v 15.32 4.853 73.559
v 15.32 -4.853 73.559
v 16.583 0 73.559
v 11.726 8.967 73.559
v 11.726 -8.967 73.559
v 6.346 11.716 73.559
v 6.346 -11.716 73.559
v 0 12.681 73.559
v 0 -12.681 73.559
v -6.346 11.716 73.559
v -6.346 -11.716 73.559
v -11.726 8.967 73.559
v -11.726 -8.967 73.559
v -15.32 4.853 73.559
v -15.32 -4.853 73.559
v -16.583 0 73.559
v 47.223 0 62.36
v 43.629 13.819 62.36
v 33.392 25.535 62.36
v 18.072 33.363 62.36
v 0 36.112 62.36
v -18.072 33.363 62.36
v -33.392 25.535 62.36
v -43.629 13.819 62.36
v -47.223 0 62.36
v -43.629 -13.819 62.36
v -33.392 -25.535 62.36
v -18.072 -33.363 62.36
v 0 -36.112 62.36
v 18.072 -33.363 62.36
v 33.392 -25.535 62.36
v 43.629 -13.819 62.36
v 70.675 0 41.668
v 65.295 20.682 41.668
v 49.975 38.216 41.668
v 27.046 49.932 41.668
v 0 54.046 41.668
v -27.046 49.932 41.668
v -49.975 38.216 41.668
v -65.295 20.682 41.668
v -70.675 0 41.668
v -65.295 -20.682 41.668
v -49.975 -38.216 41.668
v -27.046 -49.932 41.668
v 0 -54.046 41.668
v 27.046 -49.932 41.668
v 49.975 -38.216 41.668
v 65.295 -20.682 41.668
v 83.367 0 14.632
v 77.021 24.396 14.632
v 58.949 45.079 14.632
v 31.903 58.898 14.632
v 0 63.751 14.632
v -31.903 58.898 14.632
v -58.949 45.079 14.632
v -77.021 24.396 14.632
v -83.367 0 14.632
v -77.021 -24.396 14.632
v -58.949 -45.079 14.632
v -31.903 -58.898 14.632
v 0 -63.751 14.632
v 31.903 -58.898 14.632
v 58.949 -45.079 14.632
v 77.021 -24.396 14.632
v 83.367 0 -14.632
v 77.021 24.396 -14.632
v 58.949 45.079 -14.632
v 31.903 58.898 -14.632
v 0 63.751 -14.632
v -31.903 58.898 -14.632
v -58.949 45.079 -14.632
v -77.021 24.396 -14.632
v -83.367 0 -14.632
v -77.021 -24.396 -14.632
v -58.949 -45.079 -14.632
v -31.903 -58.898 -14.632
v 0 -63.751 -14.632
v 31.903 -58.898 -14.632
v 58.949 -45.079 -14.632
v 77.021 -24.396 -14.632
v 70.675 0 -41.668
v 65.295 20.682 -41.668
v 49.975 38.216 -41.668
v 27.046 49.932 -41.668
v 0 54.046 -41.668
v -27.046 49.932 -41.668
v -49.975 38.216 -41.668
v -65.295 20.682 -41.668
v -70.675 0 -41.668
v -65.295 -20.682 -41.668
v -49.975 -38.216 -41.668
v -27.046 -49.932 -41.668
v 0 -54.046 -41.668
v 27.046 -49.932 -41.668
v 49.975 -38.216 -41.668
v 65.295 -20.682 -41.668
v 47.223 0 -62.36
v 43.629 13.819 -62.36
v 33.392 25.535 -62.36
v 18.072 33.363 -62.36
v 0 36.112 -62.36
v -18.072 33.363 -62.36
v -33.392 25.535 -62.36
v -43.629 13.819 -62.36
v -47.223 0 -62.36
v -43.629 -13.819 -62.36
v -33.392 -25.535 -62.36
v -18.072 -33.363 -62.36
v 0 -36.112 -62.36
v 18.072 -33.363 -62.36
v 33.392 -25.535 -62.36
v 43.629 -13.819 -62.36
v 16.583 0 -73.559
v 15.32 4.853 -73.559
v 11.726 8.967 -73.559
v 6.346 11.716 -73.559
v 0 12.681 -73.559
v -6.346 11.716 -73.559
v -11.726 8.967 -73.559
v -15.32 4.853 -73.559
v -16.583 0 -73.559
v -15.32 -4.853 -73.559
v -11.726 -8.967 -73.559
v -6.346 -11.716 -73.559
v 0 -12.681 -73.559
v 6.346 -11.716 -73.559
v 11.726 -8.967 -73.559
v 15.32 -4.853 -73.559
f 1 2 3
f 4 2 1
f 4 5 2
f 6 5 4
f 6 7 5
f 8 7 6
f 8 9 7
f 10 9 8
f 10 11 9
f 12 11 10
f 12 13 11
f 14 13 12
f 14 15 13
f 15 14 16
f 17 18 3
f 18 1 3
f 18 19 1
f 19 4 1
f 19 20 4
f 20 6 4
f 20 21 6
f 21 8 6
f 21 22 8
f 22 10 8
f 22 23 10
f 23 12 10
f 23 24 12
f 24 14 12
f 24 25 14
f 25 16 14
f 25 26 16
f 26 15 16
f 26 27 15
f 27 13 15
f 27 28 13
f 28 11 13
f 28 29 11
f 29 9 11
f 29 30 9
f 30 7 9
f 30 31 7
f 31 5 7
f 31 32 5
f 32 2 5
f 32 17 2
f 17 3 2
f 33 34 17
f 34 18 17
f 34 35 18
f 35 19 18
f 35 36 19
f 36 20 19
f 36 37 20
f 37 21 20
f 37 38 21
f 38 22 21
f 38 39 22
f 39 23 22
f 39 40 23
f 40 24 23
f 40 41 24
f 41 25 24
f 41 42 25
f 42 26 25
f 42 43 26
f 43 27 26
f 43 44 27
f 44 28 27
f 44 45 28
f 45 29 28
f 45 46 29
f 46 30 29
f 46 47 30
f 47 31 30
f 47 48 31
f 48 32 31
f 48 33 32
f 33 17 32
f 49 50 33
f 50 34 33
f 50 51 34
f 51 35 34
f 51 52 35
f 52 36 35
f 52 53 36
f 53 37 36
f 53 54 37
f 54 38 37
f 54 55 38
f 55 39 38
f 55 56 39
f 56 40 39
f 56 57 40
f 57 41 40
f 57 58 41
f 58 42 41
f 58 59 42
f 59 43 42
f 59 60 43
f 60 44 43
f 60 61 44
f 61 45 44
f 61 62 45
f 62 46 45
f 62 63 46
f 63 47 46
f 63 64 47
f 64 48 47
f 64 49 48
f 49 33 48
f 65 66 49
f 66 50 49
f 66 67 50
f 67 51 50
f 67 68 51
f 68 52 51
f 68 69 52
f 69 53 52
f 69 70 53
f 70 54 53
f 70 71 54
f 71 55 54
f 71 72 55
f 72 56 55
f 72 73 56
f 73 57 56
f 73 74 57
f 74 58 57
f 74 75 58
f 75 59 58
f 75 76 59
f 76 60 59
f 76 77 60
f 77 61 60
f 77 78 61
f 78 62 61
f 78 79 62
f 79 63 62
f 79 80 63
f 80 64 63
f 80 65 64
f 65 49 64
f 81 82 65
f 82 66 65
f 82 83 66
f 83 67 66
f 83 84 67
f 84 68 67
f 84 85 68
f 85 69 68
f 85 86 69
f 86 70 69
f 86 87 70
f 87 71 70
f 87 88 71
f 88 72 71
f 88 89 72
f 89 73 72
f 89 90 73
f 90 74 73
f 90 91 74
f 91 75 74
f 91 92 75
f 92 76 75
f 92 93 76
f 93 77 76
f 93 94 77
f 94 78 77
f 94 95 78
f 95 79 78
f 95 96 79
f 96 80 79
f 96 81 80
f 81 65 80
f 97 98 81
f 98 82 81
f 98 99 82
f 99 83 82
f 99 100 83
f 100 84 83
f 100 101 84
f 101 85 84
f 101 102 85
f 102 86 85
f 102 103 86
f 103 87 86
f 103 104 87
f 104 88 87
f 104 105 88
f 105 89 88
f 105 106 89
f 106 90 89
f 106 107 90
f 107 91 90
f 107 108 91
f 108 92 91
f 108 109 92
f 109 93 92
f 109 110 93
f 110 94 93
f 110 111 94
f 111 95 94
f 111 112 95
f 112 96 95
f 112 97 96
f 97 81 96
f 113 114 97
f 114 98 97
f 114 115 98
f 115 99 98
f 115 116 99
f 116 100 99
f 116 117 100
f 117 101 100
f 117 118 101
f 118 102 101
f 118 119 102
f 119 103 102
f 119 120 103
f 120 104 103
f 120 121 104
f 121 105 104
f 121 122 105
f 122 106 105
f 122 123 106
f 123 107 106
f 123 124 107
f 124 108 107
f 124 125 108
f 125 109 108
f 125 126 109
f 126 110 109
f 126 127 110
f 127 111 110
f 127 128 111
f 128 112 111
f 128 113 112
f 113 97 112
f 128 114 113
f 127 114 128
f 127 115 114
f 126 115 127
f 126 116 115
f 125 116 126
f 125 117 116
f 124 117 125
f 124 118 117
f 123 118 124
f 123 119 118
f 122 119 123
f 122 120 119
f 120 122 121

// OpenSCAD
// Generated by SolidPython 1.0.1 on 2020-07-29 00:46:53


scale(v = [17, 13, 15]) {
	sphere(r = 5);
}
/***********************************************
*********      SolidPython code:      **********
************************************************
 
# import packages: SolidPython
from solid import *
from solid.utils import *
from itertools import chain, combinations, permutations


class Resize:

    def __init__(self, scad_file):
        self.scad_file = scad_file
        #self.scad_file = import_scad(scad_file)
        # cone/cylinder param:
        self.r1 = 0
        self.r2 = 0
        self.h = 0
        # rectangular prism param:
        self.w = 0
        self.l = 0
        # ellipse param:
        self.r = 0

    # import OpenScad code (file name corresponds to shape)


    # classify shape + parameters
    def assign(self, param1, param2, param3):
        if self.scad_file == 'cone.scad':
            self.r1 = param1
            self.r2 = param2
            self.h = param3
        elif self.scad_file == 'cylinder.scad':
            self.r1 = param1
            self.r2 = param2
            self.h = param3
        elif self.scad_file == 'rectangularPrism.scad':
            self.h = param1
            self.l = param2
            self.w = param3
        else:
            self.r = param1
            self.h = param2

    # resize parameters
    def iterate(self):
        x = range(3, 20, 2)
        i = 1
        if self.scad_file == 'cone.scad':
            tempList = list(permutations(x, 2))
            for temp in tempList:
                param1 = temp[0]
                param2 = temp[1]
                filepath = 'produced_scad_files/' + 'cone' + str(param1) + '_' + str(param2) + '_' + '.scad'
                scad_render_to_file(cylinder(h=param1, r1=param2, r2=0), filepath)

        elif self.scad_file == 'cylinder.scad':
            tempList = list(permutations(x, 3))
            for temp in tempList:
                param1 = temp[0]
                param2 = temp[1]
                filepath = 'produced_scad_files/' + 'cylinder' + str(param1) + '_' + str(param2) + '_' + '.scad'
                scad_render_to_file(cylinder(h=param1, r1=param2, r2=param2), filepath)

        elif self.scad_file == 'rectangularPrism.scad':
            tempList = list(permutations(x, 3))
            for temp in tempList:
                param1 = temp[0]
                param2 = temp[1]
                param3 = temp[2]
                filepath = 'produced_scad_files/' + 'rectangularPrism' + str(param1) + '_' + str(param2) + '_' + str(
                    param3) + '.scad'
                scad_render_to_file(cube(size=(param1, param2, param3)), filepath)

        elif self.scad_file == 'ellipse.scad':
            tempList = list(permutations(x, 4))
            for temp in tempList:
                param1 = temp[0]
                param2 = temp[1]
                param3 = temp[2]
                param4 = temp[3]
                filepath = 'produced_scad_files/' + 'ellipse' + str(param1) + '_' + str(param2) + '_' + str(param3) + '_' + str(param4) + '.scad'
                scad_render_to_file(scale([param1, param2, param3])(sphere(r=param4)), filepath)

    def render_to_scadfile(self):
        scad_render_to_file(scad, 'example.scad') 
 
************************************************/
